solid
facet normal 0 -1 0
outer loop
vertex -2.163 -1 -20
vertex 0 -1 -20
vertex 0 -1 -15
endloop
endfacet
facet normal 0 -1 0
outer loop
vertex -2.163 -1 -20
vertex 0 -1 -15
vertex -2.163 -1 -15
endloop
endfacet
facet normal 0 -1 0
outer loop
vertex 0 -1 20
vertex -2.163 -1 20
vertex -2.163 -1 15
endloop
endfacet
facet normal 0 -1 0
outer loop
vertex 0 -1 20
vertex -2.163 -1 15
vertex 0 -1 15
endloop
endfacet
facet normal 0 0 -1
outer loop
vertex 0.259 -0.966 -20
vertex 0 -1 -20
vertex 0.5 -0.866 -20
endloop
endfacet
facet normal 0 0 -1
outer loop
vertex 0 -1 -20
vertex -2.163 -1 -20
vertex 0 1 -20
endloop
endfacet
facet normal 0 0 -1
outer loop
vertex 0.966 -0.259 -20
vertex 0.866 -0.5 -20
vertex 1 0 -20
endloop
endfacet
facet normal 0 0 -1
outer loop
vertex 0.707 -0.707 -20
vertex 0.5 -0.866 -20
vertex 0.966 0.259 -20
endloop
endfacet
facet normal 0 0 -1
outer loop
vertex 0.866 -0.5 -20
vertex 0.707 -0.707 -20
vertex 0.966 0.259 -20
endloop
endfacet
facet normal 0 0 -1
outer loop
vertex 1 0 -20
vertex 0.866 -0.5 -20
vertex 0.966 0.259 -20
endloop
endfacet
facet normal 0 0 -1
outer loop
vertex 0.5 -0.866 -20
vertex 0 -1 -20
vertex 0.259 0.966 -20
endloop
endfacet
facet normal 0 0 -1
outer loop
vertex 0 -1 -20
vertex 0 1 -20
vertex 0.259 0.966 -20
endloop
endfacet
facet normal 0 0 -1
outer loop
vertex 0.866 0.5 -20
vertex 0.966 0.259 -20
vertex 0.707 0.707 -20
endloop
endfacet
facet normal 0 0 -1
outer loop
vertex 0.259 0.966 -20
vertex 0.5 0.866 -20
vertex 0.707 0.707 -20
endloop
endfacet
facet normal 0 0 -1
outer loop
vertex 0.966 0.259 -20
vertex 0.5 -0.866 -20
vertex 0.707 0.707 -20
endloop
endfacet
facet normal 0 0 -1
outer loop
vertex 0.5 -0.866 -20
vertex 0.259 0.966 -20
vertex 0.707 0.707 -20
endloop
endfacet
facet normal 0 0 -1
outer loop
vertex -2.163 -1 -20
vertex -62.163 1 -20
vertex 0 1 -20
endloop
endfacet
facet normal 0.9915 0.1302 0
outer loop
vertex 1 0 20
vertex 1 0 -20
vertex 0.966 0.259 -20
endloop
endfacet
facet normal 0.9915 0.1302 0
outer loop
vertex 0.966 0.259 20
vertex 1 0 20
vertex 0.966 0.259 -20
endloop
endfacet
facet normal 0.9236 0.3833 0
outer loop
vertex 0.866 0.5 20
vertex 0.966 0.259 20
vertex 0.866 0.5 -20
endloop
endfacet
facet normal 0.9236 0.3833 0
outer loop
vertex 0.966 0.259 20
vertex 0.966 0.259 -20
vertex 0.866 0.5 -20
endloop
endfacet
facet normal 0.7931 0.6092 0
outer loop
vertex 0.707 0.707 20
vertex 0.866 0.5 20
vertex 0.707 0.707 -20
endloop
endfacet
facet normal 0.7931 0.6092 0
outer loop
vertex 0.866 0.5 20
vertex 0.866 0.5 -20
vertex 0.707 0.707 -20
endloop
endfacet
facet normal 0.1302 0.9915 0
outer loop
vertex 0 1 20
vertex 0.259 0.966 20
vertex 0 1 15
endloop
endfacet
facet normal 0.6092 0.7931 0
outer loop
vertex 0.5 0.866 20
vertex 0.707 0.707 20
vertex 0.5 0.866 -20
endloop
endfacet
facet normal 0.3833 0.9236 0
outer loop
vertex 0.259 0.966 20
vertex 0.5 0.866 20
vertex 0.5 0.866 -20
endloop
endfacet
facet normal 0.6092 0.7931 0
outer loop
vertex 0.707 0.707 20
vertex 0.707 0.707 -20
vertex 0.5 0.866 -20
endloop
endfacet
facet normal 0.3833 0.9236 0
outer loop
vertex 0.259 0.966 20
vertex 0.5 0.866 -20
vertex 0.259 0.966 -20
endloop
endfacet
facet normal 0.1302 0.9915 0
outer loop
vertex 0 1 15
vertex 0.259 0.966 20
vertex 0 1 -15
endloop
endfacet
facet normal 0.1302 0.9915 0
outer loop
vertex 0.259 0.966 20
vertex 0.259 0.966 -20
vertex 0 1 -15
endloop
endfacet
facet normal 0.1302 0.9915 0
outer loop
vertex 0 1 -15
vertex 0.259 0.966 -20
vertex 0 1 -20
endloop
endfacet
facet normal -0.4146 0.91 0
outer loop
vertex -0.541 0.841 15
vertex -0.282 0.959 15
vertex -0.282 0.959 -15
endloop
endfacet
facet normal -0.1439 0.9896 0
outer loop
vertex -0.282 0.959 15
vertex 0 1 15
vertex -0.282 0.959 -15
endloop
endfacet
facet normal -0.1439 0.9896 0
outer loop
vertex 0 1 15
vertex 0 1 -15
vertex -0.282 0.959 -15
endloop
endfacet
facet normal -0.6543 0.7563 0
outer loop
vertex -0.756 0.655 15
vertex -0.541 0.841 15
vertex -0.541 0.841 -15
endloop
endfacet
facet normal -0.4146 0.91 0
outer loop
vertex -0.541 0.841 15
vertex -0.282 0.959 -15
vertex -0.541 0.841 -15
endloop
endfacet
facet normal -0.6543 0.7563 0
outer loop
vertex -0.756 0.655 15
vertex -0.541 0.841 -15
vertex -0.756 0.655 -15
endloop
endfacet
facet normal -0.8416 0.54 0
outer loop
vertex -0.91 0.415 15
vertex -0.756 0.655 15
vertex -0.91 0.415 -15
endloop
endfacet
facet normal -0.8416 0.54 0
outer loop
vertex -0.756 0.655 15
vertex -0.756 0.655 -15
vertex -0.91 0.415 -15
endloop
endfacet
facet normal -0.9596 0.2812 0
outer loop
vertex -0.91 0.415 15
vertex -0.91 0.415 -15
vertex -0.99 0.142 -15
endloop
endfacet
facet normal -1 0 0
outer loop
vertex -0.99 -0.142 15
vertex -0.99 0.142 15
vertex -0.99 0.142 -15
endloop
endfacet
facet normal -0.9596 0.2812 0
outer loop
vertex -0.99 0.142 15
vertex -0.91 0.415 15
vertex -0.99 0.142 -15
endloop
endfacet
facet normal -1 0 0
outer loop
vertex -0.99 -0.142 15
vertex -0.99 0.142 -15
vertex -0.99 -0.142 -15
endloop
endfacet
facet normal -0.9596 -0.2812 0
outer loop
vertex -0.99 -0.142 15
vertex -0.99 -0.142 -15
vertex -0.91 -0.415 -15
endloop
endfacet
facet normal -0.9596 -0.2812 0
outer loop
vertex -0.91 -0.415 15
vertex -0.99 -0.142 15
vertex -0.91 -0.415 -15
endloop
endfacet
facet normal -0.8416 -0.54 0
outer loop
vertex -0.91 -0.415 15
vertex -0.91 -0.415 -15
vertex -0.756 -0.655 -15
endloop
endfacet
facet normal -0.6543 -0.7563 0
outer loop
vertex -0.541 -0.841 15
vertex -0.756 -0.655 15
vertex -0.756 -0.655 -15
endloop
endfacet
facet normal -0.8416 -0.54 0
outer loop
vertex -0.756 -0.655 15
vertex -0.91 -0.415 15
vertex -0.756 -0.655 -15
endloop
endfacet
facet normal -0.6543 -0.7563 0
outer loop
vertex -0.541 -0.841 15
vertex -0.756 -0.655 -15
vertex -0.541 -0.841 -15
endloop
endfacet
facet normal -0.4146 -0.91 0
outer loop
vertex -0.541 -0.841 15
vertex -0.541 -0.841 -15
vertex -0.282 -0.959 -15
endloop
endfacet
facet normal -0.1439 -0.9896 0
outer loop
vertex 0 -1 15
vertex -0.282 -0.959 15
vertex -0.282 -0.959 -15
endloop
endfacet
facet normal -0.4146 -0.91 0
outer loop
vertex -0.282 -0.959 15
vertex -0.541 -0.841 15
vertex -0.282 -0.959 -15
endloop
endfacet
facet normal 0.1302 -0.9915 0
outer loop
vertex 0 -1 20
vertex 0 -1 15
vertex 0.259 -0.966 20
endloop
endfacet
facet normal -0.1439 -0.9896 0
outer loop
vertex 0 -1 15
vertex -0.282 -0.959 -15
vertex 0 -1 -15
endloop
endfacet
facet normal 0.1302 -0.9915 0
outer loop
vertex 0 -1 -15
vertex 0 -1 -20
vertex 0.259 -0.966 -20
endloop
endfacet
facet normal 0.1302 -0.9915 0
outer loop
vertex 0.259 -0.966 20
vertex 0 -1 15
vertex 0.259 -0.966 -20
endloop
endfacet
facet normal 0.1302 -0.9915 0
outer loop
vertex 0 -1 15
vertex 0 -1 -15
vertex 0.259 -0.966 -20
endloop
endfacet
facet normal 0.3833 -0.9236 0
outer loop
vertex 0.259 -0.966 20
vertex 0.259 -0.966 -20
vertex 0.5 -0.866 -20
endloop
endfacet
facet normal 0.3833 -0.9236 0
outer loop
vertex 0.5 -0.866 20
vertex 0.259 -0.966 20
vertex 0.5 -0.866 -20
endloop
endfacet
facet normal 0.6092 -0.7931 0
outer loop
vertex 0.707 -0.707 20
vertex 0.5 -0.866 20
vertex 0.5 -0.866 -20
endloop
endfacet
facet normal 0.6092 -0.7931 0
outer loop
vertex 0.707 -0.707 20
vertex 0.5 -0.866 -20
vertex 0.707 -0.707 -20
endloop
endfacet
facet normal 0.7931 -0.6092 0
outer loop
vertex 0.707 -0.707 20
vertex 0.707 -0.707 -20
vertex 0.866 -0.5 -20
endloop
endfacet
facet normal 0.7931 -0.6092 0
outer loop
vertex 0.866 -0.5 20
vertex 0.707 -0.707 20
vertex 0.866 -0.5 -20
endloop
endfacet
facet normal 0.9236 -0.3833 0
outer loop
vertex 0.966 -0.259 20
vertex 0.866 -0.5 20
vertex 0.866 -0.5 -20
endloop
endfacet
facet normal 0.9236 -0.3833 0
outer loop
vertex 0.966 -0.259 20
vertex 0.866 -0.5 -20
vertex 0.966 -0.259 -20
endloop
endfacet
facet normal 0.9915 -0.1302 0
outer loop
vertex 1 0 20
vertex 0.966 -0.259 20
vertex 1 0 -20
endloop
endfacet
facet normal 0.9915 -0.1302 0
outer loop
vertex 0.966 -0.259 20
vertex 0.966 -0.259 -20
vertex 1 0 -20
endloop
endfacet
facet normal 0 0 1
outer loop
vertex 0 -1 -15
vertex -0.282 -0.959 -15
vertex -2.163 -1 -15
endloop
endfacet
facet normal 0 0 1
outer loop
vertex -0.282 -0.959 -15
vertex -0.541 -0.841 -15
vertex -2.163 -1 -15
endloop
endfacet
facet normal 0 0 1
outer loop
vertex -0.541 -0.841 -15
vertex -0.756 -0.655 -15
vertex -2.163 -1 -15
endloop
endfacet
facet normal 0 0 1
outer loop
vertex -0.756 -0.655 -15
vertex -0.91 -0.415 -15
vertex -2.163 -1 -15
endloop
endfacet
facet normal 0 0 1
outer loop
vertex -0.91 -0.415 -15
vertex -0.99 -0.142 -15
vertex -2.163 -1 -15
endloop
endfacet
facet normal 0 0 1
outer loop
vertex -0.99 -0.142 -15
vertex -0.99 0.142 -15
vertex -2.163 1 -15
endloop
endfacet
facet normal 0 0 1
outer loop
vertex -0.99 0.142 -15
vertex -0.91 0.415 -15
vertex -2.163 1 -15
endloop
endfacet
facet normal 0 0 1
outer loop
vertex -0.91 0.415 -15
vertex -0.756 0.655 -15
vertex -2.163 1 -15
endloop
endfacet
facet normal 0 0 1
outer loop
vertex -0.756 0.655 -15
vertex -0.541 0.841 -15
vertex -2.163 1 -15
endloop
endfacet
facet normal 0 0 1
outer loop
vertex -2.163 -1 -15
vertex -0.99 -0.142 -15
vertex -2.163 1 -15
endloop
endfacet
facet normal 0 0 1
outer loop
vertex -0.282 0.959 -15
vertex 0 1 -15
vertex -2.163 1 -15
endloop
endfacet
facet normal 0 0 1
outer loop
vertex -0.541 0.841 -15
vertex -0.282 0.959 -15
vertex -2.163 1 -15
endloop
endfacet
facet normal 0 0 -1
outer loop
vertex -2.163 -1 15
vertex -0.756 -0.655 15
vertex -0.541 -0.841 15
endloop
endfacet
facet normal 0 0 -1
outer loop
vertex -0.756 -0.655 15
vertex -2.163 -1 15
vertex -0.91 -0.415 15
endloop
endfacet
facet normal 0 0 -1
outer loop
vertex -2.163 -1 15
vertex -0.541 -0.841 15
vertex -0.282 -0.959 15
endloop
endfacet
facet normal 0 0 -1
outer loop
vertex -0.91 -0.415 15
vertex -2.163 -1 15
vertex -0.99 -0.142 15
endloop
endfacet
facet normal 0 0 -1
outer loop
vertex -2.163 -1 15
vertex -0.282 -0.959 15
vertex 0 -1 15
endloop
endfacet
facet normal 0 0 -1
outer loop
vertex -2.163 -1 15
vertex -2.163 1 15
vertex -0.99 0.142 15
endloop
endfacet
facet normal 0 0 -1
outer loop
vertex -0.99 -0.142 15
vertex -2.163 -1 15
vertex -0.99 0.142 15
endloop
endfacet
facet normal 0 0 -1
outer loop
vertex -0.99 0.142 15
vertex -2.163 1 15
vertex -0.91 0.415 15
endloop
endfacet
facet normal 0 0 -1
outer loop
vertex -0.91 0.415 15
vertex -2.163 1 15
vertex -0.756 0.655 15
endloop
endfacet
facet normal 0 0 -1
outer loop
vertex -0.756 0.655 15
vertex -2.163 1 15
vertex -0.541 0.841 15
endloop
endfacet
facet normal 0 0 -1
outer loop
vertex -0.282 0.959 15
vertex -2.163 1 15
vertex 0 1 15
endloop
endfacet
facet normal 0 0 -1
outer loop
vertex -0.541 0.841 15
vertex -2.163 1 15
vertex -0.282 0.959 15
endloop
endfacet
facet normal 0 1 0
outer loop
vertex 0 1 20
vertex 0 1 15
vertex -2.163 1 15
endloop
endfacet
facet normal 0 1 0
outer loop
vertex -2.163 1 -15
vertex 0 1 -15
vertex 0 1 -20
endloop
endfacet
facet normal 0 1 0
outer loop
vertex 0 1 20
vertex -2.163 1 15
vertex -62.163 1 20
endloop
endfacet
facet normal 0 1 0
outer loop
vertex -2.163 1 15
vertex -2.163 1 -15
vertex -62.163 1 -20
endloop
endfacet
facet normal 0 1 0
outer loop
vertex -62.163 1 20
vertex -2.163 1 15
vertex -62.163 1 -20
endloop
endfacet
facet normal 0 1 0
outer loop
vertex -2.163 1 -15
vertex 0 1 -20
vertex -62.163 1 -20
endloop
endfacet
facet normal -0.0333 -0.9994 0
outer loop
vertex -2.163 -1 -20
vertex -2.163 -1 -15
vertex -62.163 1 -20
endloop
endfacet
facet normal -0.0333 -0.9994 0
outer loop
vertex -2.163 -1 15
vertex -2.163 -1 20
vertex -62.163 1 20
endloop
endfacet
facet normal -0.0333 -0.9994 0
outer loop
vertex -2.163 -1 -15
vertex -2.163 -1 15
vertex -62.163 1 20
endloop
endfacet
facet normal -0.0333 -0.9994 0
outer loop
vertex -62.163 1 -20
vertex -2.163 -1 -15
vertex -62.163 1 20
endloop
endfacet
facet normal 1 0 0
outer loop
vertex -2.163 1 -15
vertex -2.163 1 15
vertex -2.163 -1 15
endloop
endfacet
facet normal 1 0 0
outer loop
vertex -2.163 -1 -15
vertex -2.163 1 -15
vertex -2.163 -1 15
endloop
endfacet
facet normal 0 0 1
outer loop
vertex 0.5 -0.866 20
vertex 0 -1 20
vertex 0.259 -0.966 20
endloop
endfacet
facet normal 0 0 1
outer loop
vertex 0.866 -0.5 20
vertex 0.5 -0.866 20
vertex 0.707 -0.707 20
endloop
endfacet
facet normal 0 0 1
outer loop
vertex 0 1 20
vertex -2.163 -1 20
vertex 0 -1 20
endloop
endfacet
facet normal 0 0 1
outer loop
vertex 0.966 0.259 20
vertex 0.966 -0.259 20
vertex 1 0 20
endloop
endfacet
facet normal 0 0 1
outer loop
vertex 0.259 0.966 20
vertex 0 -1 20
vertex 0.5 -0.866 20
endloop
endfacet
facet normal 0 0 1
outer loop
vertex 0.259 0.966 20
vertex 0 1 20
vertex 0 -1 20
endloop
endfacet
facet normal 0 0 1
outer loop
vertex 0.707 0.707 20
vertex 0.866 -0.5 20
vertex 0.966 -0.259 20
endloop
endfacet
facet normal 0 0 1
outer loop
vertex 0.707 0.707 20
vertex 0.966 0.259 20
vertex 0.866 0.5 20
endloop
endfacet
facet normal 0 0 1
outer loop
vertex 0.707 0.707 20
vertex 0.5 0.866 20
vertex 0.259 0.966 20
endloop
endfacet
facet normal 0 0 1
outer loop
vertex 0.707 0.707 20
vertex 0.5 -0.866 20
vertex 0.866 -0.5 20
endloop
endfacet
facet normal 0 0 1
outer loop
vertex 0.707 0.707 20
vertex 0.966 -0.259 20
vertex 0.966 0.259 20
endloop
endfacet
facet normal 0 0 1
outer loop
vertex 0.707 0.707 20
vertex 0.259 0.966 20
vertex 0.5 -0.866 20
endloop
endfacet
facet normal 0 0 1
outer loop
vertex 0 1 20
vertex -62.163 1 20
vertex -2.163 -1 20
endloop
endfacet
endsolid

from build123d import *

# Parameters (mm, degrees)
BOSS_EXTRU_1_DEPTH      = 20
BOSS_EXTRU_1_DEPTH_BACK = 20
ESQUISSE1_R             = 1
BOSS_EXTRU_2_DEPTH      = 40
ESQUISSE3_W             = 2.163419692
ESQUISSE3_H             = 2
BOSS_EXTRU_3_DEPTH      = 5
ESQUISSE4_W             = 2.163419692
ESQUISSE4_H             = 2
BOSS_EXTRU_4_DEPTH      = 5


with BuildPart() as part:
    # Esquisse1 → Boss.-Extru.1 (new, two sides: drawn at the far end of the back side and taken through both)
    with BuildSketch(Plane.XY.offset(-BOSS_EXTRU_1_DEPTH_BACK)):
        Circle(ESQUISSE1_R)
    extrude(amount=BOSS_EXTRU_1_DEPTH + BOSS_EXTRU_1_DEPTH_BACK)



with BuildPart() as body_2:
    # Esquisse2 → Boss.-Extru.2 (new body)
    with BuildSketch(Plane.XY.offset(20)):
        Polygon((-2.163419692, -1), (-62.163419692, 1), (-2.163419692, 1), align=None)
    extrude(amount=-BOSS_EXTRU_2_DEPTH)


with BuildPart() as part_1:
    add(part.part)

    add(body_2.part)  # Boss.-Extru.3 merges body 2
    # Esquisse3 → Boss.-Extru.3 (add)
    with BuildSketch(Plane.XY.offset(20)):
        with Locations((-1.081709846, 0)):
            Rectangle(ESQUISSE3_W, ESQUISSE3_H)
    extrude(amount=-BOSS_EXTRU_3_DEPTH)

    # Esquisse4 → Boss.-Extru.4 (add)
    with BuildSketch(Plane(origin=(0, 0, -20), x_dir=(-1, 0, 0), z_dir=(0, 0, -1))):
        with Locations((1.081709846, 0)):
            Rectangle(ESQUISSE4_W, ESQUISSE4_H)
    extrude(amount=-BOSS_EXTRU_4_DEPTH)


solid = part_1.part
